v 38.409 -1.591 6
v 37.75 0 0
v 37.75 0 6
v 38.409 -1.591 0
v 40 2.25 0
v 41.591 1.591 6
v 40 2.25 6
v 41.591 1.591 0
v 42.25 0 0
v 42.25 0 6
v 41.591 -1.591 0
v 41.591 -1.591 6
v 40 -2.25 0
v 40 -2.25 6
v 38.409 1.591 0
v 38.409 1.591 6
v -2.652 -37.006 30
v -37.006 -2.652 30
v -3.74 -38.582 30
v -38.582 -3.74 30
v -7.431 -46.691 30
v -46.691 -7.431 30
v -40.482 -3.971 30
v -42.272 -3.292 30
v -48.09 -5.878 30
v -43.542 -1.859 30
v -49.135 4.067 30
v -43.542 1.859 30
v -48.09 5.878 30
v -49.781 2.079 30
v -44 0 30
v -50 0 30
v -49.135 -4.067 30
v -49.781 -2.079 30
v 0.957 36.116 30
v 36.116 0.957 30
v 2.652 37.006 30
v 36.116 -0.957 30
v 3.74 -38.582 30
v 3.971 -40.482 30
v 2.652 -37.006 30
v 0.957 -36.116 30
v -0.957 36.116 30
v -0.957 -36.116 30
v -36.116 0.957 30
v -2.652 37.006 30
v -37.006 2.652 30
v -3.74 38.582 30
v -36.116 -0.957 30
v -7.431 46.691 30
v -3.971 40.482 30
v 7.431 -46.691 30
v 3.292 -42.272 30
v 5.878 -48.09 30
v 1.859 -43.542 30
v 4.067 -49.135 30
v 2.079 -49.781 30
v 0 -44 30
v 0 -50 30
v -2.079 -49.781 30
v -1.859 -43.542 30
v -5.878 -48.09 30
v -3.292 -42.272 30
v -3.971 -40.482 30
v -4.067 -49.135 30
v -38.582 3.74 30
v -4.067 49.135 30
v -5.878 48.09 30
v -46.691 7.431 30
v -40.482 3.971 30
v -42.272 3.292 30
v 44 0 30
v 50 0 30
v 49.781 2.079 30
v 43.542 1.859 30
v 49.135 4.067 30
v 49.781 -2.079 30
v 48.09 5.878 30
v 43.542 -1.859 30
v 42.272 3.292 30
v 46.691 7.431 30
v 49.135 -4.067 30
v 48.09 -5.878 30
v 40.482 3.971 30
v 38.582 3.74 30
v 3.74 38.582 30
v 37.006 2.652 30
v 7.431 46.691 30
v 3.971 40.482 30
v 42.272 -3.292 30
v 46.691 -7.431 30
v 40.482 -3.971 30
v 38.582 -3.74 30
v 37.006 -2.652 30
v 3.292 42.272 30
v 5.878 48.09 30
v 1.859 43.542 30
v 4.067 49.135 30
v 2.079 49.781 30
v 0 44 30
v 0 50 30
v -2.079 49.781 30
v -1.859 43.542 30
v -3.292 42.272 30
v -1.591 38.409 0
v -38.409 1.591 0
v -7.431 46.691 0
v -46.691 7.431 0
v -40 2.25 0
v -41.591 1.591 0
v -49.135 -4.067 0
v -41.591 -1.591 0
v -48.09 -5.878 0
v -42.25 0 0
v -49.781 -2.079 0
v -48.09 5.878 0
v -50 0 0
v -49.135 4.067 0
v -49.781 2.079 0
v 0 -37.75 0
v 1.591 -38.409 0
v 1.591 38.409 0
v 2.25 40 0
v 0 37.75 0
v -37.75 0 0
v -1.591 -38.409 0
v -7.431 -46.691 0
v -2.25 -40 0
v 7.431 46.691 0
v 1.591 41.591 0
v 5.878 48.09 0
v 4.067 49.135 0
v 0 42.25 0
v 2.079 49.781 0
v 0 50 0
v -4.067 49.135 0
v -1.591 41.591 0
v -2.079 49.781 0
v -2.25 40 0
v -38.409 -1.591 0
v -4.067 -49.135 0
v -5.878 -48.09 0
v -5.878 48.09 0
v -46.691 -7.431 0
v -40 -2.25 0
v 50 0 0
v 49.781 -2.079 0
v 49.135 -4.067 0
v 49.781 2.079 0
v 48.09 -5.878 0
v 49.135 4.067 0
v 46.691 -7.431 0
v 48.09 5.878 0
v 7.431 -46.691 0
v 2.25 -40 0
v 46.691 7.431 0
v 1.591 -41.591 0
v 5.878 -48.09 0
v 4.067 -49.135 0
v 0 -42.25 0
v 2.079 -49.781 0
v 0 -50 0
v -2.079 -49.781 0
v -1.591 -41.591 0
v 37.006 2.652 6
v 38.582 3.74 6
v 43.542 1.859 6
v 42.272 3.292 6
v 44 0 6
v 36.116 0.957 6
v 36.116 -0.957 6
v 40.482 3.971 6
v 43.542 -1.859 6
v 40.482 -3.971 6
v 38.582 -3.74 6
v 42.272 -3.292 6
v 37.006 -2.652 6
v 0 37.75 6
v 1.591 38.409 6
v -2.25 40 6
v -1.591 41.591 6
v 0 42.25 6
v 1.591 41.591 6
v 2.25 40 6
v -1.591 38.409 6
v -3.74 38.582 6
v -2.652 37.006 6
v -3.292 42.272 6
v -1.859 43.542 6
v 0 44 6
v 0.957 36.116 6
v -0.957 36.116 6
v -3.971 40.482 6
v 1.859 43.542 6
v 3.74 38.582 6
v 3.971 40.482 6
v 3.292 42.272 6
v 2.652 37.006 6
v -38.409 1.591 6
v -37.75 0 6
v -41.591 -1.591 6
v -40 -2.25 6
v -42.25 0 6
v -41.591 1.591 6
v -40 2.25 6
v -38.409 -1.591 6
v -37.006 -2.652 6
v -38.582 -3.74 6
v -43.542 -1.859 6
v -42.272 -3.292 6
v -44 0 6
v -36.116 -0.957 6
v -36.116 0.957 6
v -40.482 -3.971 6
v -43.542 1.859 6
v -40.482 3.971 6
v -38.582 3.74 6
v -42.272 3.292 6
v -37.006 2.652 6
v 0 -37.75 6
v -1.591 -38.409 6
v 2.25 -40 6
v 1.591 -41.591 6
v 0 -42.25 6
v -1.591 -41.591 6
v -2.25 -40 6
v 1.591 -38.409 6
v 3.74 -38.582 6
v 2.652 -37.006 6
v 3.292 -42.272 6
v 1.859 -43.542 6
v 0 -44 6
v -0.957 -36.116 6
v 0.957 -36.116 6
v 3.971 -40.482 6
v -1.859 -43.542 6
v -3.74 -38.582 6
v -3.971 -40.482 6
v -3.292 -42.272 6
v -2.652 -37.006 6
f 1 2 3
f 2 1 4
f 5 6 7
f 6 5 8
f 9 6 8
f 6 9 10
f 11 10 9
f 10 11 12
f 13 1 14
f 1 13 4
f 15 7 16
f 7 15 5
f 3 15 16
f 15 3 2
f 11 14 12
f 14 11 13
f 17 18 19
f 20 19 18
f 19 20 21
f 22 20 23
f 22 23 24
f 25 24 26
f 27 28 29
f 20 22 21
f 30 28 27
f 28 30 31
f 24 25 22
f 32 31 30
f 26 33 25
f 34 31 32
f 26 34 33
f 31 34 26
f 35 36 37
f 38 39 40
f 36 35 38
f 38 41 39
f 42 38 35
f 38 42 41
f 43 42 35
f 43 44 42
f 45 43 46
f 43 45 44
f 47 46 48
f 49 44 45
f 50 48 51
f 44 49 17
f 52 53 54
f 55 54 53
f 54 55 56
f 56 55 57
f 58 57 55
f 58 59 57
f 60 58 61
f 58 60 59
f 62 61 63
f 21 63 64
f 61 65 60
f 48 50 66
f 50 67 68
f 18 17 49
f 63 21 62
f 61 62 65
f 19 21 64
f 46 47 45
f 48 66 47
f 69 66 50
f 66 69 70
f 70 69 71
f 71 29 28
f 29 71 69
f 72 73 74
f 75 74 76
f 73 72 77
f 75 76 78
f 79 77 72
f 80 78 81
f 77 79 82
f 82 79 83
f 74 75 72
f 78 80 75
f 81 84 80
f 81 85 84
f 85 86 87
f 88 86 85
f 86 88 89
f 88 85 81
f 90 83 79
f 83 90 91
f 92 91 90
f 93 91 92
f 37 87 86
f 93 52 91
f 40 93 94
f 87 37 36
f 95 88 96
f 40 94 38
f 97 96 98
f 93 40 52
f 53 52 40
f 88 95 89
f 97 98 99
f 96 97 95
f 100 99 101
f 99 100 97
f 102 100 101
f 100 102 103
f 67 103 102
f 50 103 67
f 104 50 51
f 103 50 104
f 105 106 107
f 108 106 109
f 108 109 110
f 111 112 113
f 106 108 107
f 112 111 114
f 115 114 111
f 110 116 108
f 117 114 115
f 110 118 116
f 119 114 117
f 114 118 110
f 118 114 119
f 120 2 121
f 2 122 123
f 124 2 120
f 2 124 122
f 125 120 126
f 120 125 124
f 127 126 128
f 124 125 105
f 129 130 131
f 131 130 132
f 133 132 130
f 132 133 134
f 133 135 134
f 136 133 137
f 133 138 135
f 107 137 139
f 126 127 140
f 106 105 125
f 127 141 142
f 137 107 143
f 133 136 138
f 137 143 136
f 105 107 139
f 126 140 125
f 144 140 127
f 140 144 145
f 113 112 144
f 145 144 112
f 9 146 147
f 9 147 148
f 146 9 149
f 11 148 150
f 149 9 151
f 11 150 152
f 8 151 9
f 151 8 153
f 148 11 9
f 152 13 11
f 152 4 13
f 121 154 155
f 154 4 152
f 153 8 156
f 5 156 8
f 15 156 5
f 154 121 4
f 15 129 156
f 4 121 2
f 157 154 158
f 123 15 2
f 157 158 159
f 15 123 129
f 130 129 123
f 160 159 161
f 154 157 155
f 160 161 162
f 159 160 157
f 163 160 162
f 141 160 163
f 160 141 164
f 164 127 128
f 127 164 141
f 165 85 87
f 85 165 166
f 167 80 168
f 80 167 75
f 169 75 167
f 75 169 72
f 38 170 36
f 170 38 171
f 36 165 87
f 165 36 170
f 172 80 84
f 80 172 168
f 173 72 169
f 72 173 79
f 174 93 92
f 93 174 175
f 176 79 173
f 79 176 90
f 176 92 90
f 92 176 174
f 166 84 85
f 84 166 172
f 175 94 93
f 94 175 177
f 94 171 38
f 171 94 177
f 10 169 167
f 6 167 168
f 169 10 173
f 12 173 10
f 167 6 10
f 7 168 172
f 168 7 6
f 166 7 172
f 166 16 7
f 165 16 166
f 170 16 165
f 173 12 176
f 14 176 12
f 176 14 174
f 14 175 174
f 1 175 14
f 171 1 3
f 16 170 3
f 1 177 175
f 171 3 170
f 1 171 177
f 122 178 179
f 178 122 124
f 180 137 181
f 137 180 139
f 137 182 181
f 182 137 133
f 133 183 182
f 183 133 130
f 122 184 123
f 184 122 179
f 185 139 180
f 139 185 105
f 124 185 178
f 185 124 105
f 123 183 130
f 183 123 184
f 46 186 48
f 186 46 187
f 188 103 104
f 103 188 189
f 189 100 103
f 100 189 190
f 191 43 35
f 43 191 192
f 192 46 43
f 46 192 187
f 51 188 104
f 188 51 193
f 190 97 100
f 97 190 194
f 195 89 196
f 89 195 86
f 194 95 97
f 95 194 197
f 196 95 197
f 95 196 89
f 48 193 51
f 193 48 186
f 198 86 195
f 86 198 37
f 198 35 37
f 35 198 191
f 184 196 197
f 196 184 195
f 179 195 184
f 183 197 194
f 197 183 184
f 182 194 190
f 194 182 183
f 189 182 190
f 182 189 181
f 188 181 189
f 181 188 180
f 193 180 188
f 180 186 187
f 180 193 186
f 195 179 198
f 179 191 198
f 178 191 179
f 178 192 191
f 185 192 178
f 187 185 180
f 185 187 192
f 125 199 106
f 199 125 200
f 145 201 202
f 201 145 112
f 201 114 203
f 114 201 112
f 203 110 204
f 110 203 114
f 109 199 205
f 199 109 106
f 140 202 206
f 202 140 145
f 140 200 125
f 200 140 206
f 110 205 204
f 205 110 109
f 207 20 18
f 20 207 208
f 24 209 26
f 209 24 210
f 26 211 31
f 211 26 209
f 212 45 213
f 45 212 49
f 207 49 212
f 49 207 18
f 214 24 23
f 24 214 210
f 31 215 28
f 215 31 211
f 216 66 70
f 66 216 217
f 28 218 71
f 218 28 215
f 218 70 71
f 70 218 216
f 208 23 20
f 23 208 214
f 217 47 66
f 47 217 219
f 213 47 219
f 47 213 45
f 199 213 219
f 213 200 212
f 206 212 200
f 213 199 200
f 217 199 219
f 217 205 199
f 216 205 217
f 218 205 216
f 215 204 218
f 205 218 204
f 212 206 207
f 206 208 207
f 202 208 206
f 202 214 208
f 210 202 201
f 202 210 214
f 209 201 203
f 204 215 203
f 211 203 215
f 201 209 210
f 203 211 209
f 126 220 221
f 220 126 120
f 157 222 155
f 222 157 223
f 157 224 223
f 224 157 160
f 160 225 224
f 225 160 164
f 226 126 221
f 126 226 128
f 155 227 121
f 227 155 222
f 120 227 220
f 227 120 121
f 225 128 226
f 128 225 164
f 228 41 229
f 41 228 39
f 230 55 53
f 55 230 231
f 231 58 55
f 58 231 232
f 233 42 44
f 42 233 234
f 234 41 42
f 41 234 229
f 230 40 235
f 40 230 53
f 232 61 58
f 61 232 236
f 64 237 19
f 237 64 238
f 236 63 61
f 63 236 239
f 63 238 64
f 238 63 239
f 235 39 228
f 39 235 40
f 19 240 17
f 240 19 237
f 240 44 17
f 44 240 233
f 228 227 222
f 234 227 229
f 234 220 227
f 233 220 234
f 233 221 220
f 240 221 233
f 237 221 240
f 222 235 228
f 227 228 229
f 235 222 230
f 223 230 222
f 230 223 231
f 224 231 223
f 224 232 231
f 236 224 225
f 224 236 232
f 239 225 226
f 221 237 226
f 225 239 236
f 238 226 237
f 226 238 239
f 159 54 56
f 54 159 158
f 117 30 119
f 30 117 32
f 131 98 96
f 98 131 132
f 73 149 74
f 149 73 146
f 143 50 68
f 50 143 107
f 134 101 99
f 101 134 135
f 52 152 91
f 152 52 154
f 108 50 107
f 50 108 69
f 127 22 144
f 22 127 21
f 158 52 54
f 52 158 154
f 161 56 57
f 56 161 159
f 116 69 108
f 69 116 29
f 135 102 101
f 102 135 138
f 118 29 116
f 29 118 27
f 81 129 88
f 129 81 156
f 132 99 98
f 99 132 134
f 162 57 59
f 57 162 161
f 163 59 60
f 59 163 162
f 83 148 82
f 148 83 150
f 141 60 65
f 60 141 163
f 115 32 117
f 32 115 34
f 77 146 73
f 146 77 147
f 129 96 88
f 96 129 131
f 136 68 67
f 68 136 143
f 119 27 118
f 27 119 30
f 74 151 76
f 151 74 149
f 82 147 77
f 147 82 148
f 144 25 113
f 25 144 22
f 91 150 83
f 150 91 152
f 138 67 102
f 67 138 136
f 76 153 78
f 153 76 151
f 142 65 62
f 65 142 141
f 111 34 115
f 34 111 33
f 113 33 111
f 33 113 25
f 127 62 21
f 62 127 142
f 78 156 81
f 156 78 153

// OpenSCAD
module cbore(hdia, hh, cbdia, cbh) {
    cylinder(d=hdia, h=hh);
    translate([0,0, hh-cbh]) cylinder(d=cbdia, h=cbh);
}

module pcd(n, d) {
    angle = 360/n;
    for (i=[0:n-1]) {
        rotate([0,0,i*angle]) translate([d/2,0,0]) children();
    }
}

module boss_on_pcd(n, pcd, r) {
    hull() {
        for (i=[0: n-1]) {
            pcd(n, pcd) circle(r=r);
        }
    }
}

module cb_boss() {
    thk = 30;
    difference() {
        union() {
            linear_extrude(thk) boss_on_pcd(4, 80, 10);
        }
        pcd(4, 80) cbore(4.5, thk, 8, thk-6);
    }
}

cb_boss();
